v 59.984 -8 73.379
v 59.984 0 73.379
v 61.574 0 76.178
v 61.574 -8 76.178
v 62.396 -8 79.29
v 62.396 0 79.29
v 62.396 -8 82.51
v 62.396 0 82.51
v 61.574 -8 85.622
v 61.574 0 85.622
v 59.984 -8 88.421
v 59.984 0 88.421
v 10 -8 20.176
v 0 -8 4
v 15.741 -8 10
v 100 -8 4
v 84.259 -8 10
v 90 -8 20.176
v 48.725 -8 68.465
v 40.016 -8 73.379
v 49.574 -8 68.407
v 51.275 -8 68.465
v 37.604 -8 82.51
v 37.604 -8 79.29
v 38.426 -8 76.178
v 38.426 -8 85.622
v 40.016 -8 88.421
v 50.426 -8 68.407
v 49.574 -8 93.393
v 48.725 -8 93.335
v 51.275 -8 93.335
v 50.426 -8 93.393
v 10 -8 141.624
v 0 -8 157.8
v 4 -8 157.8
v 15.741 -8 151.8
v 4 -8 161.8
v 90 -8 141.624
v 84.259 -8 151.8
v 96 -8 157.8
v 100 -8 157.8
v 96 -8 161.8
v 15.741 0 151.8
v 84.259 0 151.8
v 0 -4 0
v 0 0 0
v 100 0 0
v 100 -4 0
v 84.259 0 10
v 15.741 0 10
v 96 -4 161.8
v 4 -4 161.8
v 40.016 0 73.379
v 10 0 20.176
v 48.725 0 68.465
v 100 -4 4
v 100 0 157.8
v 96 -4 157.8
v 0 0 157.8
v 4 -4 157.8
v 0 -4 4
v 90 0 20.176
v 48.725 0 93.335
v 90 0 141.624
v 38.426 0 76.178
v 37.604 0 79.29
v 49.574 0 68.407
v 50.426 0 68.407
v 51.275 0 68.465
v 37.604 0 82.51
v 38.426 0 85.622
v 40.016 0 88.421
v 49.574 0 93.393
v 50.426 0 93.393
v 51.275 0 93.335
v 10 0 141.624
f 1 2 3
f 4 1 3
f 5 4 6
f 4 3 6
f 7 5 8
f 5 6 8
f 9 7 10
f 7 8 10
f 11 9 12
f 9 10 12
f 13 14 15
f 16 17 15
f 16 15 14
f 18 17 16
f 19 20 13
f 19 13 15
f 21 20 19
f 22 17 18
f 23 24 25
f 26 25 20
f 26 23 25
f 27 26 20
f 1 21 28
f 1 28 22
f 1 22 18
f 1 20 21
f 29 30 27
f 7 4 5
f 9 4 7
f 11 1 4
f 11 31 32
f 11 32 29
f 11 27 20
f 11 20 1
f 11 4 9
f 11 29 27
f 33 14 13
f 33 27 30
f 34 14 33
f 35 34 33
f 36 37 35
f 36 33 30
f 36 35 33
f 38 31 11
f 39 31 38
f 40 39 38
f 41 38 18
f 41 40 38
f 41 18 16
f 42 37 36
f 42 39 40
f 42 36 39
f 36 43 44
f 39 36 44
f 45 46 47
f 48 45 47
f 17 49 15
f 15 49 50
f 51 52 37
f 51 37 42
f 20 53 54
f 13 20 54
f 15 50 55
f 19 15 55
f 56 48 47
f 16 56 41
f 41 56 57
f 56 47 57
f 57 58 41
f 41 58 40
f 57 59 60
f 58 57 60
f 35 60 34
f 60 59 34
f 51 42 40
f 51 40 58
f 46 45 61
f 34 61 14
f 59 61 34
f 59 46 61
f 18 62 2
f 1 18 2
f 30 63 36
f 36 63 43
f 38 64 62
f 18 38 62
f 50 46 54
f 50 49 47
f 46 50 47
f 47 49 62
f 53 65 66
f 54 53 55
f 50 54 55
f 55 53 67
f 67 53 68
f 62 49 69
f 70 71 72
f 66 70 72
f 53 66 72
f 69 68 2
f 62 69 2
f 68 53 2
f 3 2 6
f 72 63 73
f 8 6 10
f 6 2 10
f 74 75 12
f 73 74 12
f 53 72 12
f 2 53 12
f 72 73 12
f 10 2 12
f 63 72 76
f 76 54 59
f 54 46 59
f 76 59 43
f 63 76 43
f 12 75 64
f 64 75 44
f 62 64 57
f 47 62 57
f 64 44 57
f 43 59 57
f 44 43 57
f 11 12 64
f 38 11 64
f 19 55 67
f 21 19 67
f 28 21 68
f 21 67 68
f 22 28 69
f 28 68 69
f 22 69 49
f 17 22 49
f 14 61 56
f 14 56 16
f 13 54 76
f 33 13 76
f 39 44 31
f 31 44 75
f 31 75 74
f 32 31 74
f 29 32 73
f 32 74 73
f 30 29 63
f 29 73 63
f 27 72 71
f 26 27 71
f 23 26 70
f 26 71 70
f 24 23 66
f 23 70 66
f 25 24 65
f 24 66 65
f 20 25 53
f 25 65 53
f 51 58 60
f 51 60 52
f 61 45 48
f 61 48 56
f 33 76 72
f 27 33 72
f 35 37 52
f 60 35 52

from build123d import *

# Parameters (mm, degrees)
F0_W     = 100
F0_H     = 161.8
F1_DEPTH = 8
F2_W     = 4
F2_H     = 4
F3_DEPTH = 134.44841
F4_W     = 4
F4_H     = 4
F5_DEPTH = 4


with BuildPart() as f1:
    # F0 (on Front) → F1 (new body)
    with BuildSketch(Plane.XZ):
        with Locations((50, 80.9)):
            Rectangle(F0_W, F0_H)
        with BuildLine():
            Line((84.259152, 10), (15.740848, 10))
            Line((15.740848, 10), (48.725419, 68.465152))
            ThreePointArc((48.725419, 68.465152), (50, 68.4), (51.274581, 68.465152))
            Line((51.274581, 68.465152), (84.259152, 10))
        make_face(mode=Mode.SUBTRACT)
        with BuildLine():
            Line((40.015904, 73.378842), (10, 20.175653))
            Line((10, 20.175653), (10, 141.624347))
            Line((10, 141.624347), (40.015904, 88.421158))
            ThreePointArc((40.015904, 88.421158), (37.5, 80.9), (40.015904, 73.378842))
        make_face(mode=Mode.SUBTRACT)
        with BuildLine():
            Line((90, 141.624347), (90, 20.175653))
            Line((90, 20.175653), (59.984096, 73.378842))
            ThreePointArc((59.984096, 73.378842), (62.5, 80.9), (59.984096, 88.421158))
            Line((59.984096, 88.421158), (90, 141.624347))
        make_face(mode=Mode.SUBTRACT)
        with BuildLine():
            Line((15.740848, 151.8), (84.259152, 151.8))
            Line((84.259152, 151.8), (51.274581, 93.334848))
            ThreePointArc((51.274581, 93.334848), (50, 93.4), (48.725419, 93.334848))
            Line((48.725419, 93.334848), (15.740848, 151.8))
        make_face(mode=Mode.SUBTRACT)
    extrude(amount=F1_DEPTH)

    # F2 (on face) → F3 (cut)
    with BuildSketch(Plane(origin=(0, 0, 0), x_dir=(0, -1, 0), z_dir=(-1, 0, 0))):
        with Locations((2, 159.8)):
            Rectangle(F2_W, F2_H)
        with Locations((6, 2)):
            Rectangle(F2_W, F2_H)
    extrude(amount=-F3_DEPTH, mode=Mode.SUBTRACT)

    # F4 (on face) → F5 (cut)
    with BuildSketch(Plane.XY.offset(161.8)):
        with Locations((98, -6)):
            Rectangle(F4_W, F4_H)
        with Locations((2, -6)):
            Rectangle(F4_W, F4_H)
    extrude(amount=-F5_DEPTH, mode=Mode.SUBTRACT)


solid = f1.part
